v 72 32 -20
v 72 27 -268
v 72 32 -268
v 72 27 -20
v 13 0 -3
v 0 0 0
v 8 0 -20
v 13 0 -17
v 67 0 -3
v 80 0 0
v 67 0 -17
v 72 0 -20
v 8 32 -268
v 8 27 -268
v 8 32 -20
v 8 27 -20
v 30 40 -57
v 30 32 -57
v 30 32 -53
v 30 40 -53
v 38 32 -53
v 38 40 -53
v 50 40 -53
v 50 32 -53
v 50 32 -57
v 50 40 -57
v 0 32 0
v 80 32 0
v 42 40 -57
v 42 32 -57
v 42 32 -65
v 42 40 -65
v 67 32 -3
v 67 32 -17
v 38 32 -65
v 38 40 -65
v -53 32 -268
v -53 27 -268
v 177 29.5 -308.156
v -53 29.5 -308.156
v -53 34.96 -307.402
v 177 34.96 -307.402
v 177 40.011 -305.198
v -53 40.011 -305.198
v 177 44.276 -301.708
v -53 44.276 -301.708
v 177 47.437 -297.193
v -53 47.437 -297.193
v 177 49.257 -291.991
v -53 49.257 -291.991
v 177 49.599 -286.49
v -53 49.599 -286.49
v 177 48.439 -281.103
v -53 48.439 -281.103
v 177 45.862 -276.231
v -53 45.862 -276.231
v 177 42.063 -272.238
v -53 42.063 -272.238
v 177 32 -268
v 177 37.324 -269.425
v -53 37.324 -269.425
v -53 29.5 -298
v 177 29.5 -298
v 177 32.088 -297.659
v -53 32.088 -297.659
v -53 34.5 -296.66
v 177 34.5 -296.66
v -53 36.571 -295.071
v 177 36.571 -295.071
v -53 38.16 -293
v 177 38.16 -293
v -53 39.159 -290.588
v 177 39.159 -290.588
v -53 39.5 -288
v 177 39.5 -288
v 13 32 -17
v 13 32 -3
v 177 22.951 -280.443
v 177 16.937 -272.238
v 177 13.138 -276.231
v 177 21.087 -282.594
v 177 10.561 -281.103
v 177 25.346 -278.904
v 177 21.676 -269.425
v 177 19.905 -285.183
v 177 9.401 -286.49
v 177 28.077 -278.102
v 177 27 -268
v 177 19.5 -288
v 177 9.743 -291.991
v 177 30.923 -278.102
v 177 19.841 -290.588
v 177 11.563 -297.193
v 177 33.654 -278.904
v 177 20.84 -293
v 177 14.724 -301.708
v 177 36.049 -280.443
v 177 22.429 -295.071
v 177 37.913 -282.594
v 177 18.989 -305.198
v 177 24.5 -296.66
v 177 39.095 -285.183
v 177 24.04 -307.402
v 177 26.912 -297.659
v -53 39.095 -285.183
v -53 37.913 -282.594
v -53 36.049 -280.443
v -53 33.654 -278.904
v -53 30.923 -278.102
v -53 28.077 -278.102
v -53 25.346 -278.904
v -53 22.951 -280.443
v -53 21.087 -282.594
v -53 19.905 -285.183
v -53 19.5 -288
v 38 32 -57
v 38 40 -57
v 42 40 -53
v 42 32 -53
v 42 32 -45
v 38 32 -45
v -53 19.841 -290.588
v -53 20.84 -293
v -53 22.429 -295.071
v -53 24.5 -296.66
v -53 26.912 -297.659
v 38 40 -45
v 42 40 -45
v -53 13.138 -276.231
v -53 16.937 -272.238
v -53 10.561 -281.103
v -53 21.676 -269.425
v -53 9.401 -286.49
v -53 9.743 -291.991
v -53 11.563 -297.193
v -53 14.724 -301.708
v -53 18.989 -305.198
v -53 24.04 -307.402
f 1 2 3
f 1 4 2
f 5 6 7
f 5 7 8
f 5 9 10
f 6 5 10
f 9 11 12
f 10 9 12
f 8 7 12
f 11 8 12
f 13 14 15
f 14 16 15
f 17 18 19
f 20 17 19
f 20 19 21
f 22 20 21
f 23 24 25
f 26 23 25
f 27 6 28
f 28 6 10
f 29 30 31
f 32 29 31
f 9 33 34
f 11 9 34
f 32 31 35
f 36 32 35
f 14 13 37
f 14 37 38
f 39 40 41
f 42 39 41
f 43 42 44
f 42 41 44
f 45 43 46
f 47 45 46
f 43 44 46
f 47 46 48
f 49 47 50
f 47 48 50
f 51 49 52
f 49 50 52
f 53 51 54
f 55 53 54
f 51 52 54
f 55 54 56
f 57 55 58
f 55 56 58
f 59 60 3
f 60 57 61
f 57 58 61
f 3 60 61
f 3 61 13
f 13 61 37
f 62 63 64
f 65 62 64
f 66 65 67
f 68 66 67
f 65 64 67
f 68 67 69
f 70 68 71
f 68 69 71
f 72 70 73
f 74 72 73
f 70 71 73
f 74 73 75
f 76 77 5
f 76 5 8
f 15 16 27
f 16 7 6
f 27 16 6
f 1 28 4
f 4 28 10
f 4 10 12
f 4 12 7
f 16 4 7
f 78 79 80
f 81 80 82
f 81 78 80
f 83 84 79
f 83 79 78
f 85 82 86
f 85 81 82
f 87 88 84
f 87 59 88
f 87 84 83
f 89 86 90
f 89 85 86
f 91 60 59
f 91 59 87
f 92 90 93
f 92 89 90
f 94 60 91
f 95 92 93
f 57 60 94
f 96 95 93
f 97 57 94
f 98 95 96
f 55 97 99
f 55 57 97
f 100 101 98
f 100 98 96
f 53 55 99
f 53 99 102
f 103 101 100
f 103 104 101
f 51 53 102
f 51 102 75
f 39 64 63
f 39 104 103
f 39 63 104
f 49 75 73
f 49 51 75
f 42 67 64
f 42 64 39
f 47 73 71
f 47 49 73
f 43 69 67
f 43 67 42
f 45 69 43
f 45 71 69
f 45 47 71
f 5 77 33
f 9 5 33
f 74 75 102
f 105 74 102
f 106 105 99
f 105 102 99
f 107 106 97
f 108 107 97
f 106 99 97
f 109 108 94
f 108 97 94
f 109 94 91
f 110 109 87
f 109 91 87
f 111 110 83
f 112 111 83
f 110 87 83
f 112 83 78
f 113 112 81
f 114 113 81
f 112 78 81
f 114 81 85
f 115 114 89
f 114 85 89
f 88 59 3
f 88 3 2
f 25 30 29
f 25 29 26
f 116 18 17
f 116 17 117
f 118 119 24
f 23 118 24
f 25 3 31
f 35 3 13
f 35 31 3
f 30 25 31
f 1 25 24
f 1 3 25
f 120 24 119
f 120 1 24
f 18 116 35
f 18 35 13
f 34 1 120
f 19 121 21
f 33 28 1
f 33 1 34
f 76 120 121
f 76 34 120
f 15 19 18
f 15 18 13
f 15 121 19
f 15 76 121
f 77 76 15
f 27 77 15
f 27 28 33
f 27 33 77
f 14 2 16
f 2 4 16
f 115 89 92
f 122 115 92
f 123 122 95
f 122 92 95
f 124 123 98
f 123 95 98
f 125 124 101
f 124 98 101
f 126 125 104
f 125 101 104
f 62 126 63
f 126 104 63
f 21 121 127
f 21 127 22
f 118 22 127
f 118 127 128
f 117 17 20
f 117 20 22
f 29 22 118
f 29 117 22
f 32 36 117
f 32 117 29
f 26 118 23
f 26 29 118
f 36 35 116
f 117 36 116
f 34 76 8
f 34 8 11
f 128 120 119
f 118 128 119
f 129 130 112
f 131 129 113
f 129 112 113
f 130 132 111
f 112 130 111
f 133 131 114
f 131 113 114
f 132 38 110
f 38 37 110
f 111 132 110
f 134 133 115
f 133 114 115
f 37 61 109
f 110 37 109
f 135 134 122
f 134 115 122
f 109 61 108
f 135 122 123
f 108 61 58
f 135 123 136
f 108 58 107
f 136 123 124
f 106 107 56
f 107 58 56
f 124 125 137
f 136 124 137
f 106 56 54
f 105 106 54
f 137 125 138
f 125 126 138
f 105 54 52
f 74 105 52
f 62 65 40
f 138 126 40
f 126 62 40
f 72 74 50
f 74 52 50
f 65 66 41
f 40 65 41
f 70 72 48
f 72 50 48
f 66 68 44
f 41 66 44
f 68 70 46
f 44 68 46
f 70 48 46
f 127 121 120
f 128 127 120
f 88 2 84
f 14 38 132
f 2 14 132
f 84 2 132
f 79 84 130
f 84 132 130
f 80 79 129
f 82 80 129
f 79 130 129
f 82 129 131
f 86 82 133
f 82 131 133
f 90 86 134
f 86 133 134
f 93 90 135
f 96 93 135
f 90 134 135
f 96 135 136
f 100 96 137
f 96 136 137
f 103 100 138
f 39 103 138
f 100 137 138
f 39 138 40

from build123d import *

# Parameters (mm, degrees)
BOSS_EXTRUDE2_DEPTH      = 32
SKETCH5_W                = 54
SKETCH5_H                = 14
CUT_EXTRUDE1_DEPTH       = 32
SKETCH6_W                = 64
SKETCH6_H                = 5
BOSS_EXTRUDE3_DEPTH      = 70
SKETCH7_W                = 2
SKETCH7_H                = 8
SKETCH7_H_2              = 2
SKETCH7_W_2              = 8
BOSS_EXTRUDE4_DEPTH      = 8
SKETCH8_W                = 64
SKETCH8_H                = 5
BOSS_EXTRUDE5_DEPTH      = 178
BOSS_EXTRUDE7_DEPTH      = 105
BOSS_EXTRUDE7_DEPTH_BACK = 125
CUT_EXTRUDE4_DEPTH       = 264


with BuildPart() as part:
    # Sketch4 → Boss-Extrude2 (new body)
    with BuildSketch(Plane(origin=(0, 0, 0), x_dir=(1, 0, 0), z_dir=(0, 1, 0))):
        Polygon((8, 20), (0, 0), (80, 0), (72, 20), align=None)
    extrude(amount=BOSS_EXTRUDE2_DEPTH)

    # Sketch5 → Cut-Extrude1 (cut)
    with BuildSketch(Plane(origin=(0, 32, 0), x_dir=(1, 0, 0), z_dir=(0, 1, 0))):
        with Locations((40, 10)):
            Rectangle(SKETCH5_W, SKETCH5_H)
    extrude(amount=-CUT_EXTRUDE1_DEPTH, mode=Mode.SUBTRACT)

    # Sketch6 → Boss-Extrude3 (add)
    with BuildSketch(Plane(origin=(0, 0, -20), x_dir=(-1, 0, 0), z_dir=(0, 0, -1))):
        with Locations((-40, 29.5)):
            Rectangle(SKETCH6_W, SKETCH6_H)
    extrude(amount=BOSS_EXTRUDE3_DEPTH)

    # Sketch7 → Boss-Extrude4 (add)
    with BuildSketch(Plane(origin=(0, 32, 0), x_dir=(1, 0, 0), z_dir=(0, 1, 0))):
        with Locations((41, 61)):
            Rectangle(SKETCH7_W, SKETCH7_H)
        with Locations((39, 61)):
            Rectangle(SKETCH7_W, SKETCH7_H)
        with Locations((39, 56)):
            Rectangle(SKETCH7_W, SKETCH7_H_2)
        with Locations((41, 56)):
            Rectangle(SKETCH7_W, SKETCH7_H_2)
        with Locations((34, 56)):
            Rectangle(SKETCH7_W_2, SKETCH7_H_2)
        with Locations((34, 54)):
            Rectangle(SKETCH7_W_2, SKETCH7_H_2)
        with Locations((39, 54)):
            Rectangle(SKETCH7_W, SKETCH7_H_2)
        with Locations((41, 54)):
            Rectangle(SKETCH7_W, SKETCH7_H_2)
        with Locations((41, 49)):
            Rectangle(SKETCH7_W, SKETCH7_H)
        with Locations((39, 49)):
            Rectangle(SKETCH7_W, SKETCH7_H)
        with Locations((46, 54)):
            Rectangle(SKETCH7_W_2, SKETCH7_H_2)
        with Locations((46, 56)):
            Rectangle(SKETCH7_W_2, SKETCH7_H_2)
    extrude(amount=BOSS_EXTRUDE4_DEPTH)

    # Sketch8 → Boss-Extrude5 (add)
    with BuildSketch(Plane(origin=(0, 0, -90), x_dir=(-1, 0, 0), z_dir=(0, 0, -1))):
        with Locations((-40, 29.5)):
            Rectangle(SKETCH8_W, SKETCH8_H)
    extrude(amount=BOSS_EXTRUDE5_DEPTH)

    # Sketch13 → Boss-Extrude7 (add, two sides: drawn at the far end of the back side and taken through both)
    with BuildSketch(Plane(origin=(72, 0, 0), x_dir=(0, 0, -1), z_dir=(1, 0, 0)).offset(-BOSS_EXTRUDE7_DEPTH_BACK)):
        with BuildLine():
            ThreePointArc((268, 27), (289.252420174, 9.383304354), (308.155644371, 29.5))
            ThreePointArc((308.155644371, 29.5), (289.252420174, 49.616695646), (268, 32))
            Line((268, 32), (268, 29.5))
            Line((268, 29.5), (268, 27))
        make_face()
    extrude(amount=BOSS_EXTRUDE7_DEPTH + BOSS_EXTRUDE7_DEPTH_BACK)

    # Sketch14 → Cut-Extrude4 (cut)
    with BuildSketch(Plane(origin=(177, 0, 0), x_dir=(0, 0, -1), z_dir=(1, 0, 0))):
        with BuildLine():
            ThreePointArc((298, 29.5), (295.071067812, 36.571067812), (288, 39.5))
            Line((288, 39.5), (288, 19.5))
            ThreePointArc((288, 19.5), (295.071067812, 22.428932188), (298, 29.5))
        make_face()
        with BuildLine():
            Line((288, 19.5), (288, 39.5))
            ThreePointArc((288, 39.5), (278, 29.5), (288, 19.5))
        make_face()
    extrude(amount=-CUT_EXTRUDE4_DEPTH, mode=Mode.SUBTRACT)


solid = part.part
